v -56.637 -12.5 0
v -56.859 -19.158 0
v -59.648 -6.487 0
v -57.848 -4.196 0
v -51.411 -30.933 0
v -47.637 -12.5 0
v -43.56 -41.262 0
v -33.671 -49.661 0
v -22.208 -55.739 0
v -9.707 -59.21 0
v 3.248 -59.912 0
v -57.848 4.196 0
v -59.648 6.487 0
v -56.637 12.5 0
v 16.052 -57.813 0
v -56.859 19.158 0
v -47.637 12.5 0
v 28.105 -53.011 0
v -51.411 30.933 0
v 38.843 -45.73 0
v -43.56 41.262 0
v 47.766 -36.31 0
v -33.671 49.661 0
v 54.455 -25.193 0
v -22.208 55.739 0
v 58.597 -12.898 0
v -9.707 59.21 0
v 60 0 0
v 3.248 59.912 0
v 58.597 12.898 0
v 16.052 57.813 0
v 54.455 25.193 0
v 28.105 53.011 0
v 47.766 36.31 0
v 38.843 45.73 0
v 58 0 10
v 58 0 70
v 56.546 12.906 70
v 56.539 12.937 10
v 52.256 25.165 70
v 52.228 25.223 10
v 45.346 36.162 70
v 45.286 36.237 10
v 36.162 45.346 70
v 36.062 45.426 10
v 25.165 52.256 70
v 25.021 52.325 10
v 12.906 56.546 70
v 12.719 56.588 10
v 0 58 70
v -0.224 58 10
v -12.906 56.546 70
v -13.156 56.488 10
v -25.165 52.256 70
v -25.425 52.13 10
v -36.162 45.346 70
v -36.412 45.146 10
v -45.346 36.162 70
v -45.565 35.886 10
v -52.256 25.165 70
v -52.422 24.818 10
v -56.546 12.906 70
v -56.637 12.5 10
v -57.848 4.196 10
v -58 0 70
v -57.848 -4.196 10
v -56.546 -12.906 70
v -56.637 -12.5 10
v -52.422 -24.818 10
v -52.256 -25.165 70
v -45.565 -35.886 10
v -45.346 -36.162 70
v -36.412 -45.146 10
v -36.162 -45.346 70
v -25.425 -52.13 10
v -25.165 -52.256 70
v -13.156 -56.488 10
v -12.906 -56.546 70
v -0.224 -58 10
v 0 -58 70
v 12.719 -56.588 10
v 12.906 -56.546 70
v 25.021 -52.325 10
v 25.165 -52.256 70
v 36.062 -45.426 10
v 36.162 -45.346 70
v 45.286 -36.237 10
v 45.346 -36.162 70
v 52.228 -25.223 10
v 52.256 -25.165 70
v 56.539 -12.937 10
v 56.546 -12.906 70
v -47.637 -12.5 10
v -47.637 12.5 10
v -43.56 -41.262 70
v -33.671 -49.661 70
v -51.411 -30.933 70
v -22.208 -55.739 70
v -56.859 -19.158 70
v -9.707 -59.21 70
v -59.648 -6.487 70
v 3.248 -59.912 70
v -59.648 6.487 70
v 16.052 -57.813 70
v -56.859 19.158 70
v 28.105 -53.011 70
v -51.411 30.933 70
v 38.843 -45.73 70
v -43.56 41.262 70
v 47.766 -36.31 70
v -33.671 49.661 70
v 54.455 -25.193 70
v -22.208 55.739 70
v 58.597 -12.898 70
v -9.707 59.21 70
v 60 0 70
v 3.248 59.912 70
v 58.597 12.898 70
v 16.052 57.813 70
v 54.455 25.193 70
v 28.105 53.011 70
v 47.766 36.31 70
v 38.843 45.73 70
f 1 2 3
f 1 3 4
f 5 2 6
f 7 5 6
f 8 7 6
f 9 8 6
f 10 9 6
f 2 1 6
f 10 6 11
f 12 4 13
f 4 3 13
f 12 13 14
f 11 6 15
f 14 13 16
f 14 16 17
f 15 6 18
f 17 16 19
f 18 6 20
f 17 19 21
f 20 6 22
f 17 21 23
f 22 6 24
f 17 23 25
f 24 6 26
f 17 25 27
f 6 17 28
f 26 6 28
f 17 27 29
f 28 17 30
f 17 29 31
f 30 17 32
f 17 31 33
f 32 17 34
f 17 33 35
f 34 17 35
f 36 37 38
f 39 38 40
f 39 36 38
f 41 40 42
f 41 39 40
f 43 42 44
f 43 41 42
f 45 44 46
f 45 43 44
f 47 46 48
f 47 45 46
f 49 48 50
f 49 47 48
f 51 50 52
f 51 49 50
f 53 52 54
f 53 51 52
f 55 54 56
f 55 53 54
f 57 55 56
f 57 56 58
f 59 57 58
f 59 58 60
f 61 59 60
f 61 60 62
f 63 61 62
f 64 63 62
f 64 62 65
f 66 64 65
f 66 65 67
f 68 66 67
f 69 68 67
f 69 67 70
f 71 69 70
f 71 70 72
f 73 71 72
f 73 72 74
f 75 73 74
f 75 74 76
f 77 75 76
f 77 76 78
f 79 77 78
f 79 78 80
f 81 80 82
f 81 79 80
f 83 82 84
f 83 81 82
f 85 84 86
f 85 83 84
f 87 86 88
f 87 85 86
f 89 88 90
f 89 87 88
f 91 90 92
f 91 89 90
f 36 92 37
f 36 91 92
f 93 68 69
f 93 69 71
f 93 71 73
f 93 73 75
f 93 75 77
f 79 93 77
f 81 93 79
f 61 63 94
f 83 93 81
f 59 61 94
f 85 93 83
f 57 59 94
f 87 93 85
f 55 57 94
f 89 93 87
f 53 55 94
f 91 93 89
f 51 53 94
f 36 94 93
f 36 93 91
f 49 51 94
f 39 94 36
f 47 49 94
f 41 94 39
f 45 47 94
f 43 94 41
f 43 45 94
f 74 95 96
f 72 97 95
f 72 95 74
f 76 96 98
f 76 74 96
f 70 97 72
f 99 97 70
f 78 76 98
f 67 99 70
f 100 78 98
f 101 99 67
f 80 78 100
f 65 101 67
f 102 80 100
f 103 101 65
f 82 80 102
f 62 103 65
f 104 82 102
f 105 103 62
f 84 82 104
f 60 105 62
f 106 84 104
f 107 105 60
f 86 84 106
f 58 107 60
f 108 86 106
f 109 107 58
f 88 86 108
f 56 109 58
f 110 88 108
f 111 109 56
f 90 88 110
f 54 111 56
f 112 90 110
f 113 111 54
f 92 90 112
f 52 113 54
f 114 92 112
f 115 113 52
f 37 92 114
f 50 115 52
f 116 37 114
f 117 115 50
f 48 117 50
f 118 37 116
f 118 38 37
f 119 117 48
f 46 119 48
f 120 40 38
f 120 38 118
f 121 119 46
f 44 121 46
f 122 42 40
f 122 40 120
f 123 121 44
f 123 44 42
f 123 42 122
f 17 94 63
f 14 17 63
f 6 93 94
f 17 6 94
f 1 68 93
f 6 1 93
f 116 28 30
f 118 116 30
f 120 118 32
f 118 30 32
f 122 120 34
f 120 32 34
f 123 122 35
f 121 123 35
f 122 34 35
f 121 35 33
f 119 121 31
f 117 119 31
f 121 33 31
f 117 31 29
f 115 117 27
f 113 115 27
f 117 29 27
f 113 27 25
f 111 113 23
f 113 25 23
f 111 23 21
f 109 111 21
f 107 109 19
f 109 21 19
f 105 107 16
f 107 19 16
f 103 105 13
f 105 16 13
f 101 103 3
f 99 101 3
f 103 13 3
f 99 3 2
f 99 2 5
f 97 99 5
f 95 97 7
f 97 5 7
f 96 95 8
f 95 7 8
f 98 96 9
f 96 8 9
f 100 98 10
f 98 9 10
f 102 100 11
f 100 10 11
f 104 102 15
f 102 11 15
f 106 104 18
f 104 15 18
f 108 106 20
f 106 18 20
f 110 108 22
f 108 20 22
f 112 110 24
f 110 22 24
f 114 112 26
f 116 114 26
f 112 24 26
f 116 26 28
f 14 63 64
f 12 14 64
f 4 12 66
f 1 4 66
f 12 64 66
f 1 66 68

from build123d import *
from build123d import SkipClean  # not in build123d's __all__

# Parameters (mm, degrees)
F0_R     = 58
F1_DEPTH = 10
F0_R_2   = 60
F2_DEPTH = 70
F4_DEPTH = 10.001


with BuildPart() as f1:
    # F0 (on Top) → F1 (new body)
    with BuildSketch(Plane.XY):
        Circle(F0_R)
    extrude(amount=F1_DEPTH)

    # F0 (on Top) → F2 (join)
    with BuildSketch(Plane.XY):
        Circle(F0_R_2)
        Circle(F0_R, mode=Mode.SUBTRACT)
    extrude(amount=F2_DEPTH)

    # F3 (on face) → F4 (cut, through all)
    with BuildSketch(Plane.XY.offset(10)):
        with BuildLine():
            Line((-47.6370020393, 12.5), (-56.6370020393, 12.5))
            ThreePointArc((-56.6370020393, 12.5), (-58, 0), (-56.6370020393, -12.5))
            Line((-56.6370020393, -12.5), (-47.6370020393, -12.5))
            Line((-47.6370020393, -12.5), (-47.6370020393, 12.5))
        make_face()
    with SkipClean():  # cleaning this boolean's faces spoils the solid; the shape is the same uncleaned
        extrude(amount=-F4_DEPTH, mode=Mode.SUBTRACT)


solid = f1.part
